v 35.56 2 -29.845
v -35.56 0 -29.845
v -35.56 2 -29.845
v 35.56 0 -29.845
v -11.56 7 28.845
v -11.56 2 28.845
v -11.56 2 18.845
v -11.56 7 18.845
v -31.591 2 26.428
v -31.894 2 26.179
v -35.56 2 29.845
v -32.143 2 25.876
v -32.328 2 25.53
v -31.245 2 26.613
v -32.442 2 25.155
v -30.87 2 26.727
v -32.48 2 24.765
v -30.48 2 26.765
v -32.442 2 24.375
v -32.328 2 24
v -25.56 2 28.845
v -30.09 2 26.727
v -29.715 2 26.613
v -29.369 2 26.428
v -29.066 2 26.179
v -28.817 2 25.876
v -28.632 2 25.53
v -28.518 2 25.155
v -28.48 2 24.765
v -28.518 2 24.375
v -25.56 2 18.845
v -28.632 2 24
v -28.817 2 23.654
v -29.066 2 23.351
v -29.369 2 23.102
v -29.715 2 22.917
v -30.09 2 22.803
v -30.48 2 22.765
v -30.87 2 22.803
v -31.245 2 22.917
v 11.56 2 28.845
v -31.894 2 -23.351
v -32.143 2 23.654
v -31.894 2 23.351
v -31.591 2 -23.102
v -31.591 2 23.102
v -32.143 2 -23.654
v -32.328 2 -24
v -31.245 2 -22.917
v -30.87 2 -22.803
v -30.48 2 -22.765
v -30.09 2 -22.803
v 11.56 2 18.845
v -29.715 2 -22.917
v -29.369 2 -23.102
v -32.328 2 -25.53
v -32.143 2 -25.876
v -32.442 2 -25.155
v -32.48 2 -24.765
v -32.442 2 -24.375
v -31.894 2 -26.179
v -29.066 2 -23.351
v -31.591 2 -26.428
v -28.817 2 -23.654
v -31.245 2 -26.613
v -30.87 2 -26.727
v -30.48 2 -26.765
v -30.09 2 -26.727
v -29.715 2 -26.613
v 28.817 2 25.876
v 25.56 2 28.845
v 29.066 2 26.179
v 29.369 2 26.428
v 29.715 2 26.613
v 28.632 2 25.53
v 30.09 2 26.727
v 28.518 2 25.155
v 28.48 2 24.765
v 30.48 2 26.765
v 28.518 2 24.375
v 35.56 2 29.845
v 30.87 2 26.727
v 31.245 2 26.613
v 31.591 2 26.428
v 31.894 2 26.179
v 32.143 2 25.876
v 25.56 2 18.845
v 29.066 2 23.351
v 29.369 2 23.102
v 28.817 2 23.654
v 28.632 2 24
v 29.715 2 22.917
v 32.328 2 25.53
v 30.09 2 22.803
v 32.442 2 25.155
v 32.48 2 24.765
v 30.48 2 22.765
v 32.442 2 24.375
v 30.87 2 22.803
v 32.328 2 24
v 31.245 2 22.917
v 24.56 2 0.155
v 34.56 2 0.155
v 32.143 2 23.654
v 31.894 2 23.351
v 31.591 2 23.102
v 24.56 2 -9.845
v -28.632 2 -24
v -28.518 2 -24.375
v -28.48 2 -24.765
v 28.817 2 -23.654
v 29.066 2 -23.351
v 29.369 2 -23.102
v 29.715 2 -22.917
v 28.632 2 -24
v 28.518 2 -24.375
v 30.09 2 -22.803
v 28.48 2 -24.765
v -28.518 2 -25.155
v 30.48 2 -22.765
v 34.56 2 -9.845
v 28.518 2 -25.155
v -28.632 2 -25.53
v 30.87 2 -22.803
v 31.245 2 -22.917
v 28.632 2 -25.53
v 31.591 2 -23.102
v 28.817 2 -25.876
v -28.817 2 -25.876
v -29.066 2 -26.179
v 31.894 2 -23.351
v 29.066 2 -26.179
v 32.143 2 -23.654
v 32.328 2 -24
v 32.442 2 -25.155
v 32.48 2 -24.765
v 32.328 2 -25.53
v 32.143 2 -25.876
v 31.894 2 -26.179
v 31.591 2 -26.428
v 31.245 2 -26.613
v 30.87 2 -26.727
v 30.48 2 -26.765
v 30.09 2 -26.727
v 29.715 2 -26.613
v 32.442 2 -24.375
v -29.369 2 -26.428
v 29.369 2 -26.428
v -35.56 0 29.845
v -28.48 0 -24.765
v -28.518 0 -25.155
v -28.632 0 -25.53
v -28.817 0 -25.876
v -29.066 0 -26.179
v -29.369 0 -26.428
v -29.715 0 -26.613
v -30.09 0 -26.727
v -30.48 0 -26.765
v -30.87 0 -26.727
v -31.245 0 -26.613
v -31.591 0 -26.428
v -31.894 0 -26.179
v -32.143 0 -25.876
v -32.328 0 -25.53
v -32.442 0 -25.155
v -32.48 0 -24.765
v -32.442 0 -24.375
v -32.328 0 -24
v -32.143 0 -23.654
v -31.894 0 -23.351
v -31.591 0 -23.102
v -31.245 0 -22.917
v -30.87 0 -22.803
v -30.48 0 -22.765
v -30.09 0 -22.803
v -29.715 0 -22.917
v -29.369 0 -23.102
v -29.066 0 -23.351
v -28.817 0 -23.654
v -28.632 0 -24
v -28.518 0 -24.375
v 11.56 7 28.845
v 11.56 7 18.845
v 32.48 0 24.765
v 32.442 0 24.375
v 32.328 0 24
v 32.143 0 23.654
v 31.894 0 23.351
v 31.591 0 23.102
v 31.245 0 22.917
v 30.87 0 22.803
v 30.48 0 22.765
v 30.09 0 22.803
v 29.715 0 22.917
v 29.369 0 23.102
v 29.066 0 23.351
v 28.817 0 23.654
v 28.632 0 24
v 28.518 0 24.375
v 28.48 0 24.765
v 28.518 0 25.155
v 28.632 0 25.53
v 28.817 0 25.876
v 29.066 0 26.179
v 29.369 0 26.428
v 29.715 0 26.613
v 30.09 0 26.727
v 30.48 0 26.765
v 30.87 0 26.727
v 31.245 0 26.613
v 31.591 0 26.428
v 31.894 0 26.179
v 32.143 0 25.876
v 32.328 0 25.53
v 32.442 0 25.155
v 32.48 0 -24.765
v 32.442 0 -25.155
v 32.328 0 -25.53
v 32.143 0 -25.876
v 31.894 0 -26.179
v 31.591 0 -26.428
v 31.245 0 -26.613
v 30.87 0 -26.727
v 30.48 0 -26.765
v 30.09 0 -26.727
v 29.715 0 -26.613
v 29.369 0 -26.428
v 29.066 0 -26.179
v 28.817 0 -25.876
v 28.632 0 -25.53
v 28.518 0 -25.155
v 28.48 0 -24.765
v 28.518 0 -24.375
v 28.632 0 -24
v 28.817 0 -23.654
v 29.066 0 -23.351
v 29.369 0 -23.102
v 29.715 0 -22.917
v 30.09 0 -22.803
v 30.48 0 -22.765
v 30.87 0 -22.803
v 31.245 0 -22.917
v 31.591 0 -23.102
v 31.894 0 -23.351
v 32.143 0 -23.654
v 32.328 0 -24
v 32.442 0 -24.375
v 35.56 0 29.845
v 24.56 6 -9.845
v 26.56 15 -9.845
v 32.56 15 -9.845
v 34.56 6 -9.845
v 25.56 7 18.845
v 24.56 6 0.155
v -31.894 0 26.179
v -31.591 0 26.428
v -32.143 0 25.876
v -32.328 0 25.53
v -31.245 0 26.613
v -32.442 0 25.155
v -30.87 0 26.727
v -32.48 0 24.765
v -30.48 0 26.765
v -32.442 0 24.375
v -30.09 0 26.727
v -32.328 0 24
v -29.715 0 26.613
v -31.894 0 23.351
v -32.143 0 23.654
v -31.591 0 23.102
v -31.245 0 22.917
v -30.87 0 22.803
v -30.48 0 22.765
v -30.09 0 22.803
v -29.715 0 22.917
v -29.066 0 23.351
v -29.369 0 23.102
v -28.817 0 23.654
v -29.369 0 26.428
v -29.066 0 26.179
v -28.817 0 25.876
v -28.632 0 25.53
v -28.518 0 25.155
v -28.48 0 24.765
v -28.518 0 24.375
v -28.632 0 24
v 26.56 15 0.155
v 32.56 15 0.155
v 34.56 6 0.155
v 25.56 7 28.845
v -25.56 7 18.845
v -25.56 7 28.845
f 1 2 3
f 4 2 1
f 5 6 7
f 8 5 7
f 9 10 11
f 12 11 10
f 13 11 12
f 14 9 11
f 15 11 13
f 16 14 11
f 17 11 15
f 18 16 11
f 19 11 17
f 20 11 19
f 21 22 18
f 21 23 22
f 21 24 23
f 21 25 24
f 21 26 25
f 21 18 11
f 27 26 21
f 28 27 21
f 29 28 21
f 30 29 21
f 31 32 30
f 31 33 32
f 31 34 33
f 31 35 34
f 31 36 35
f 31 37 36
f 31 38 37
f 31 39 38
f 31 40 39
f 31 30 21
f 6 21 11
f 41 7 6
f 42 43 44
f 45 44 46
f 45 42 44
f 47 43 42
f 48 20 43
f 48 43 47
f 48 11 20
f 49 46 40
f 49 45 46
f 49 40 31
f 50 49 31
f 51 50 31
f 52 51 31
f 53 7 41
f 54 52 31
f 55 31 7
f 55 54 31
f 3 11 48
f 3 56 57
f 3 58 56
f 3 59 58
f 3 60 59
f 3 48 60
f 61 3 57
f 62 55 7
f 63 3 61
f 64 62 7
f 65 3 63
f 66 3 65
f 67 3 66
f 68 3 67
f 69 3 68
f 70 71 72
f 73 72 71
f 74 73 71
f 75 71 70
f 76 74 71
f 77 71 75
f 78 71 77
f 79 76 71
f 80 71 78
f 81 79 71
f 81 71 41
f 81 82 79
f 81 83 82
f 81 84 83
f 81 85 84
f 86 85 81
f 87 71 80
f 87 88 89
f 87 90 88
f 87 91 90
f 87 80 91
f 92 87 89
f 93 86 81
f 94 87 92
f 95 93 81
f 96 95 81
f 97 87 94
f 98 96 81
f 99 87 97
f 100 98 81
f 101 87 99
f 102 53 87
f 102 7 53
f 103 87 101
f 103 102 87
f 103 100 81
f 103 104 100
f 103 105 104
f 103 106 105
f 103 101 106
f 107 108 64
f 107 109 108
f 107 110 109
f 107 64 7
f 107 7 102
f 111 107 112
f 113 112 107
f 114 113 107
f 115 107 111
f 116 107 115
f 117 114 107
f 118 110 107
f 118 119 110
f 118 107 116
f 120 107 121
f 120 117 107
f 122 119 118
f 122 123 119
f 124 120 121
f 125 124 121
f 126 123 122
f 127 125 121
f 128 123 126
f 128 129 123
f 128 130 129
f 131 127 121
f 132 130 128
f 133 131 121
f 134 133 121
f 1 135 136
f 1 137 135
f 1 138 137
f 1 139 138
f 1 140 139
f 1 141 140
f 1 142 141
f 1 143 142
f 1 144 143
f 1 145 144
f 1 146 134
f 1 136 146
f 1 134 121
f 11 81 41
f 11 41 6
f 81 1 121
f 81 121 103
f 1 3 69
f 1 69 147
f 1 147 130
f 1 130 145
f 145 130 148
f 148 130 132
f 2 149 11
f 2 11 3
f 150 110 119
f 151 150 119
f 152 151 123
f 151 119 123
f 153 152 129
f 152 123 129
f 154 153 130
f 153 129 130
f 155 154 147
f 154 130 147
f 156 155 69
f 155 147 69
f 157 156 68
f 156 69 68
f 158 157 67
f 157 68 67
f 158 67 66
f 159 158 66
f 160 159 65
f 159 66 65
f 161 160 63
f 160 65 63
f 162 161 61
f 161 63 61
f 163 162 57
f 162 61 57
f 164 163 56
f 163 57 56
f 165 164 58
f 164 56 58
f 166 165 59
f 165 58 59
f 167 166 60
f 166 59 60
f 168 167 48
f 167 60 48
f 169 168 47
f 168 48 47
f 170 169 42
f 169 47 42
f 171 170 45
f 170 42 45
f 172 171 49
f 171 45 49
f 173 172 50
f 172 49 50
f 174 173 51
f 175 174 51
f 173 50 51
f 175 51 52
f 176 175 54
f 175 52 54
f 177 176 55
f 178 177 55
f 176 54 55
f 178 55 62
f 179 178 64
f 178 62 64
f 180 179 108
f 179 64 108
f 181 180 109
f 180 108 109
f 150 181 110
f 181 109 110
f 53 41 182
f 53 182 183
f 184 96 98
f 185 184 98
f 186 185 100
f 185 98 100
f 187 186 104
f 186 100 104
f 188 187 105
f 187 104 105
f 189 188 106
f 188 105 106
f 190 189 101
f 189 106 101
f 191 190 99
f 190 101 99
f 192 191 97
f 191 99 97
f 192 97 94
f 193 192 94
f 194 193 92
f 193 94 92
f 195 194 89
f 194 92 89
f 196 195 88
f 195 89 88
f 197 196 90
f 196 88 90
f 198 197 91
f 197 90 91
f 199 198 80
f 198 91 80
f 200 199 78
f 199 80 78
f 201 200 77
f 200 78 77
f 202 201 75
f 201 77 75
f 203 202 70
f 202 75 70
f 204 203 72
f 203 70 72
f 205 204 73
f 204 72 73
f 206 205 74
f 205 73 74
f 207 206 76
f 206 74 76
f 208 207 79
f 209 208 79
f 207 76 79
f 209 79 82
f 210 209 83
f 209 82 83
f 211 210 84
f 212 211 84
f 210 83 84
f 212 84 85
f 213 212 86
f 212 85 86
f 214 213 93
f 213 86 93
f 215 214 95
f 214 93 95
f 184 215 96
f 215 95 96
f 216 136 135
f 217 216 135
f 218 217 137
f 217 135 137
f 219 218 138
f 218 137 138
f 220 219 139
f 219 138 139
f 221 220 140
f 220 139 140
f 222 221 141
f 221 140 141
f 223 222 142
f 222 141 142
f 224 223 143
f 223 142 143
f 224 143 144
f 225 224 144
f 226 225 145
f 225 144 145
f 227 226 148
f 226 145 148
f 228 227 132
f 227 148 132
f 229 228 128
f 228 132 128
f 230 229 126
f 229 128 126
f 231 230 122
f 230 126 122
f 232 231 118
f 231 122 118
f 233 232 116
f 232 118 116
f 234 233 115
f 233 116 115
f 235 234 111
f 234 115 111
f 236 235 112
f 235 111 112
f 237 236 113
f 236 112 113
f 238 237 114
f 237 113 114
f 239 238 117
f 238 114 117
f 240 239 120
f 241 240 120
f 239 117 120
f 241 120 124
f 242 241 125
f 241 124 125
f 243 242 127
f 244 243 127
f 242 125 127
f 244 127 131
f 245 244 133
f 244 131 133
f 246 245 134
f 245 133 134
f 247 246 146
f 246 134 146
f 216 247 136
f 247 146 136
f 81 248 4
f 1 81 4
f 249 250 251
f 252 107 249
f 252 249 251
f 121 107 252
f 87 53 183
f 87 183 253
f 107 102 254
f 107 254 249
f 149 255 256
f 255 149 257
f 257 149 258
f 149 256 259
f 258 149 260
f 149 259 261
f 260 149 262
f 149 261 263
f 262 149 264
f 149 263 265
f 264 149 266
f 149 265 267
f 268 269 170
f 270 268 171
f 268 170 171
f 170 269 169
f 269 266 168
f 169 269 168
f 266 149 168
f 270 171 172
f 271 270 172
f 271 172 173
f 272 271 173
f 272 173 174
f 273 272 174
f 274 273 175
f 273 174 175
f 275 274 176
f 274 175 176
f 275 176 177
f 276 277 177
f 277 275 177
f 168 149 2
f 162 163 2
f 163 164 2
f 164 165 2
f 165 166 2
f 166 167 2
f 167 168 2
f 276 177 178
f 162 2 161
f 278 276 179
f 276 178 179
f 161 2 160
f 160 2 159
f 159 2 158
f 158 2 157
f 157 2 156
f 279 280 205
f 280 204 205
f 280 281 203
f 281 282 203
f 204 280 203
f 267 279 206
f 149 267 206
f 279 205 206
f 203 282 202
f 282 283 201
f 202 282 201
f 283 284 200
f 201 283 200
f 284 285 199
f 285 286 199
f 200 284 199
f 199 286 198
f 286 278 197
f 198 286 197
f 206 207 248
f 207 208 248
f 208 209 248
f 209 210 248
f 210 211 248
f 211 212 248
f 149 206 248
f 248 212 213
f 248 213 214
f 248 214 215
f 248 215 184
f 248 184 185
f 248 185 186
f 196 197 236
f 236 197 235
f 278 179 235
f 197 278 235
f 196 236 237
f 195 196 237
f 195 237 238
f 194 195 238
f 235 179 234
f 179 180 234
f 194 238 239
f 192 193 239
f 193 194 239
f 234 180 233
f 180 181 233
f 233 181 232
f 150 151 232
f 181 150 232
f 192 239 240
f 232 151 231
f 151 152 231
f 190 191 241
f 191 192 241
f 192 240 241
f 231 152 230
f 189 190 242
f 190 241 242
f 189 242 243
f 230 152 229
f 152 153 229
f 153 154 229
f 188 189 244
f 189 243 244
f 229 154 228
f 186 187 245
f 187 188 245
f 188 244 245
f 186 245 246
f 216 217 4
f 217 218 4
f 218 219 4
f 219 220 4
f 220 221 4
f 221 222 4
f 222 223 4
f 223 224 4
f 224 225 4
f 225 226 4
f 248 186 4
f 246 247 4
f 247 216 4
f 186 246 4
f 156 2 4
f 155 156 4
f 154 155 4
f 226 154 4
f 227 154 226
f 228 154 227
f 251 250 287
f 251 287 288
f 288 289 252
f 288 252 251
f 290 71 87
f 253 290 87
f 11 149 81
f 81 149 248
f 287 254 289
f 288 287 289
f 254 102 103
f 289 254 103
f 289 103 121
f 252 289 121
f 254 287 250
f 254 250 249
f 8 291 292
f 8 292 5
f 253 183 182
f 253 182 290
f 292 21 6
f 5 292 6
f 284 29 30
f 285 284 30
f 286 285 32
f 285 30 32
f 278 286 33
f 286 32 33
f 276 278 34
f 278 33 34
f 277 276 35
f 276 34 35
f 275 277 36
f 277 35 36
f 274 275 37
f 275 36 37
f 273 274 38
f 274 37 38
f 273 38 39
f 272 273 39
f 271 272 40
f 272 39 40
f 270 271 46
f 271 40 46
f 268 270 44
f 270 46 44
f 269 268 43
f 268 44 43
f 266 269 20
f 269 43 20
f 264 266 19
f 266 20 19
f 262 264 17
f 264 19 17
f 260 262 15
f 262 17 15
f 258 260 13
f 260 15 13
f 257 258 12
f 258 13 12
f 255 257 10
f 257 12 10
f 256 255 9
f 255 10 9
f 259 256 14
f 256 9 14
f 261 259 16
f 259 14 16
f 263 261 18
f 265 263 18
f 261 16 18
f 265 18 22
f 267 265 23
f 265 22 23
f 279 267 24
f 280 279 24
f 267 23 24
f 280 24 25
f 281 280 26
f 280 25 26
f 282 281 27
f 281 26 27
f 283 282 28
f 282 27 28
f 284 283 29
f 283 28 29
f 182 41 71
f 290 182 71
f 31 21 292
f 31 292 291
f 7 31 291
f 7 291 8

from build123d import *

# Parameters (mm, degrees)
SKETCH1_W           = 71.12
SKETCH1_H           = 59.69
BOSS_EXTRUDE1_DEPTH = 2
SKETCH2_R           = 2
CUT_EXTRUDE1_DEPTH  = 2
SKETCH3_W           = 14
SKETCH3_H           = 10
BOSS_EXTRUDE2_DEPTH = 5
SKETCH4_W           = 10
SKETCH4_H           = 10
BOSS_EXTRUDE3_DEPTH = 13
CUT_EXTRUDE2_DEPTH  = 31


with BuildPart() as part:
    # Sketch1 → Boss-Extrude1 (new body)
    with BuildSketch(Plane(origin=(0, 0, 0), x_dir=(1, 0, 0), z_dir=(0, 1, 0))):
        Rectangle(SKETCH1_W, SKETCH1_H)
    extrude(amount=BOSS_EXTRUDE1_DEPTH)

    # Sketch2 → Cut-Extrude1 (cut)
    with BuildSketch(Plane(origin=(0, 2, 0), x_dir=(1, 0, 0), z_dir=(0, 1, 0))):
        with Locations((-30.48, 24.765)):
            Circle(SKETCH2_R)
        with Locations((30.48, 24.765)):
            Circle(SKETCH2_R)
        with Locations((30.48, -24.765)):
            Circle(SKETCH2_R)
        with Locations((-30.48, -24.765)):
            Circle(SKETCH2_R)
    extrude(amount=-CUT_EXTRUDE1_DEPTH, mode=Mode.SUBTRACT)

    # Sketch3 → Boss-Extrude2 (add)
    with BuildSketch(Plane(origin=(0, 2, 0), x_dir=(1, 0, 0), z_dir=(0, 1, 0))):
        with Locations((-18.56, -23.845)):
            Rectangle(SKETCH3_W, SKETCH3_H)
        with Locations((18.56, -23.845)):
            Rectangle(SKETCH3_W, SKETCH3_H)
    extrude(amount=BOSS_EXTRUDE2_DEPTH)

    # Sketch4 → Boss-Extrude3 (add)
    with BuildSketch(Plane(origin=(0, 2, 0), x_dir=(1, 0, 0), z_dir=(0, 1, 0))):
        with Locations((29.56, 4.845)):
            Rectangle(SKETCH4_W, SKETCH4_H)
    extrude(amount=BOSS_EXTRUDE3_DEPTH)

    # Sketch7 → Cut-Extrude2 (cut, through all)
    with BuildSketch(Plane.XY.offset(0.155)):
        Polygon((26.56, 15), (24.56, 6), (24.56, 15), align=None)
        Polygon((34.56, 6), (32.56, 15), (34.56, 15), align=None)
    extrude(amount=-CUT_EXTRUDE2_DEPTH, mode=Mode.SUBTRACT)


solid = part.part
